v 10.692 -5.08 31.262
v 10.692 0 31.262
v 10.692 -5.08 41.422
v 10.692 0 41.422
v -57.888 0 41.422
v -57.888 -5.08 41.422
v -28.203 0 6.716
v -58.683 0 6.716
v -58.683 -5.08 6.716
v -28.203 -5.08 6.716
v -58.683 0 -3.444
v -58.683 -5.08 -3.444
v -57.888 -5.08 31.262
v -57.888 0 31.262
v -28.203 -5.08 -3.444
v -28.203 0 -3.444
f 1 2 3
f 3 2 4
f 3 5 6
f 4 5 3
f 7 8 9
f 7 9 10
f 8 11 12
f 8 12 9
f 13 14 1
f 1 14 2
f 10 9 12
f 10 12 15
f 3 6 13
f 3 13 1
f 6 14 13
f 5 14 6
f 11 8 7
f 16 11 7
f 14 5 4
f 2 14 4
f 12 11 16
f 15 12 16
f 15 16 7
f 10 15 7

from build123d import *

# Parameters (mm, degrees)
F0_W     = 68.58
F0_H     = 10.16
F0_W_2   = 30.48
F1_DEPTH = 5.08


with BuildPart() as f1:
    # F0 (on Front) → F1 (new body)
    with BuildSketch(Plane.XZ):
        with Locations((-23.598031, 36.342185)):
            Rectangle(F0_W, F0_H)
        with Locations((-43.442829, 1.635861)):
            Rectangle(F0_W_2, F0_H)
    extrude(amount=F1_DEPTH)


solid = f1.part
